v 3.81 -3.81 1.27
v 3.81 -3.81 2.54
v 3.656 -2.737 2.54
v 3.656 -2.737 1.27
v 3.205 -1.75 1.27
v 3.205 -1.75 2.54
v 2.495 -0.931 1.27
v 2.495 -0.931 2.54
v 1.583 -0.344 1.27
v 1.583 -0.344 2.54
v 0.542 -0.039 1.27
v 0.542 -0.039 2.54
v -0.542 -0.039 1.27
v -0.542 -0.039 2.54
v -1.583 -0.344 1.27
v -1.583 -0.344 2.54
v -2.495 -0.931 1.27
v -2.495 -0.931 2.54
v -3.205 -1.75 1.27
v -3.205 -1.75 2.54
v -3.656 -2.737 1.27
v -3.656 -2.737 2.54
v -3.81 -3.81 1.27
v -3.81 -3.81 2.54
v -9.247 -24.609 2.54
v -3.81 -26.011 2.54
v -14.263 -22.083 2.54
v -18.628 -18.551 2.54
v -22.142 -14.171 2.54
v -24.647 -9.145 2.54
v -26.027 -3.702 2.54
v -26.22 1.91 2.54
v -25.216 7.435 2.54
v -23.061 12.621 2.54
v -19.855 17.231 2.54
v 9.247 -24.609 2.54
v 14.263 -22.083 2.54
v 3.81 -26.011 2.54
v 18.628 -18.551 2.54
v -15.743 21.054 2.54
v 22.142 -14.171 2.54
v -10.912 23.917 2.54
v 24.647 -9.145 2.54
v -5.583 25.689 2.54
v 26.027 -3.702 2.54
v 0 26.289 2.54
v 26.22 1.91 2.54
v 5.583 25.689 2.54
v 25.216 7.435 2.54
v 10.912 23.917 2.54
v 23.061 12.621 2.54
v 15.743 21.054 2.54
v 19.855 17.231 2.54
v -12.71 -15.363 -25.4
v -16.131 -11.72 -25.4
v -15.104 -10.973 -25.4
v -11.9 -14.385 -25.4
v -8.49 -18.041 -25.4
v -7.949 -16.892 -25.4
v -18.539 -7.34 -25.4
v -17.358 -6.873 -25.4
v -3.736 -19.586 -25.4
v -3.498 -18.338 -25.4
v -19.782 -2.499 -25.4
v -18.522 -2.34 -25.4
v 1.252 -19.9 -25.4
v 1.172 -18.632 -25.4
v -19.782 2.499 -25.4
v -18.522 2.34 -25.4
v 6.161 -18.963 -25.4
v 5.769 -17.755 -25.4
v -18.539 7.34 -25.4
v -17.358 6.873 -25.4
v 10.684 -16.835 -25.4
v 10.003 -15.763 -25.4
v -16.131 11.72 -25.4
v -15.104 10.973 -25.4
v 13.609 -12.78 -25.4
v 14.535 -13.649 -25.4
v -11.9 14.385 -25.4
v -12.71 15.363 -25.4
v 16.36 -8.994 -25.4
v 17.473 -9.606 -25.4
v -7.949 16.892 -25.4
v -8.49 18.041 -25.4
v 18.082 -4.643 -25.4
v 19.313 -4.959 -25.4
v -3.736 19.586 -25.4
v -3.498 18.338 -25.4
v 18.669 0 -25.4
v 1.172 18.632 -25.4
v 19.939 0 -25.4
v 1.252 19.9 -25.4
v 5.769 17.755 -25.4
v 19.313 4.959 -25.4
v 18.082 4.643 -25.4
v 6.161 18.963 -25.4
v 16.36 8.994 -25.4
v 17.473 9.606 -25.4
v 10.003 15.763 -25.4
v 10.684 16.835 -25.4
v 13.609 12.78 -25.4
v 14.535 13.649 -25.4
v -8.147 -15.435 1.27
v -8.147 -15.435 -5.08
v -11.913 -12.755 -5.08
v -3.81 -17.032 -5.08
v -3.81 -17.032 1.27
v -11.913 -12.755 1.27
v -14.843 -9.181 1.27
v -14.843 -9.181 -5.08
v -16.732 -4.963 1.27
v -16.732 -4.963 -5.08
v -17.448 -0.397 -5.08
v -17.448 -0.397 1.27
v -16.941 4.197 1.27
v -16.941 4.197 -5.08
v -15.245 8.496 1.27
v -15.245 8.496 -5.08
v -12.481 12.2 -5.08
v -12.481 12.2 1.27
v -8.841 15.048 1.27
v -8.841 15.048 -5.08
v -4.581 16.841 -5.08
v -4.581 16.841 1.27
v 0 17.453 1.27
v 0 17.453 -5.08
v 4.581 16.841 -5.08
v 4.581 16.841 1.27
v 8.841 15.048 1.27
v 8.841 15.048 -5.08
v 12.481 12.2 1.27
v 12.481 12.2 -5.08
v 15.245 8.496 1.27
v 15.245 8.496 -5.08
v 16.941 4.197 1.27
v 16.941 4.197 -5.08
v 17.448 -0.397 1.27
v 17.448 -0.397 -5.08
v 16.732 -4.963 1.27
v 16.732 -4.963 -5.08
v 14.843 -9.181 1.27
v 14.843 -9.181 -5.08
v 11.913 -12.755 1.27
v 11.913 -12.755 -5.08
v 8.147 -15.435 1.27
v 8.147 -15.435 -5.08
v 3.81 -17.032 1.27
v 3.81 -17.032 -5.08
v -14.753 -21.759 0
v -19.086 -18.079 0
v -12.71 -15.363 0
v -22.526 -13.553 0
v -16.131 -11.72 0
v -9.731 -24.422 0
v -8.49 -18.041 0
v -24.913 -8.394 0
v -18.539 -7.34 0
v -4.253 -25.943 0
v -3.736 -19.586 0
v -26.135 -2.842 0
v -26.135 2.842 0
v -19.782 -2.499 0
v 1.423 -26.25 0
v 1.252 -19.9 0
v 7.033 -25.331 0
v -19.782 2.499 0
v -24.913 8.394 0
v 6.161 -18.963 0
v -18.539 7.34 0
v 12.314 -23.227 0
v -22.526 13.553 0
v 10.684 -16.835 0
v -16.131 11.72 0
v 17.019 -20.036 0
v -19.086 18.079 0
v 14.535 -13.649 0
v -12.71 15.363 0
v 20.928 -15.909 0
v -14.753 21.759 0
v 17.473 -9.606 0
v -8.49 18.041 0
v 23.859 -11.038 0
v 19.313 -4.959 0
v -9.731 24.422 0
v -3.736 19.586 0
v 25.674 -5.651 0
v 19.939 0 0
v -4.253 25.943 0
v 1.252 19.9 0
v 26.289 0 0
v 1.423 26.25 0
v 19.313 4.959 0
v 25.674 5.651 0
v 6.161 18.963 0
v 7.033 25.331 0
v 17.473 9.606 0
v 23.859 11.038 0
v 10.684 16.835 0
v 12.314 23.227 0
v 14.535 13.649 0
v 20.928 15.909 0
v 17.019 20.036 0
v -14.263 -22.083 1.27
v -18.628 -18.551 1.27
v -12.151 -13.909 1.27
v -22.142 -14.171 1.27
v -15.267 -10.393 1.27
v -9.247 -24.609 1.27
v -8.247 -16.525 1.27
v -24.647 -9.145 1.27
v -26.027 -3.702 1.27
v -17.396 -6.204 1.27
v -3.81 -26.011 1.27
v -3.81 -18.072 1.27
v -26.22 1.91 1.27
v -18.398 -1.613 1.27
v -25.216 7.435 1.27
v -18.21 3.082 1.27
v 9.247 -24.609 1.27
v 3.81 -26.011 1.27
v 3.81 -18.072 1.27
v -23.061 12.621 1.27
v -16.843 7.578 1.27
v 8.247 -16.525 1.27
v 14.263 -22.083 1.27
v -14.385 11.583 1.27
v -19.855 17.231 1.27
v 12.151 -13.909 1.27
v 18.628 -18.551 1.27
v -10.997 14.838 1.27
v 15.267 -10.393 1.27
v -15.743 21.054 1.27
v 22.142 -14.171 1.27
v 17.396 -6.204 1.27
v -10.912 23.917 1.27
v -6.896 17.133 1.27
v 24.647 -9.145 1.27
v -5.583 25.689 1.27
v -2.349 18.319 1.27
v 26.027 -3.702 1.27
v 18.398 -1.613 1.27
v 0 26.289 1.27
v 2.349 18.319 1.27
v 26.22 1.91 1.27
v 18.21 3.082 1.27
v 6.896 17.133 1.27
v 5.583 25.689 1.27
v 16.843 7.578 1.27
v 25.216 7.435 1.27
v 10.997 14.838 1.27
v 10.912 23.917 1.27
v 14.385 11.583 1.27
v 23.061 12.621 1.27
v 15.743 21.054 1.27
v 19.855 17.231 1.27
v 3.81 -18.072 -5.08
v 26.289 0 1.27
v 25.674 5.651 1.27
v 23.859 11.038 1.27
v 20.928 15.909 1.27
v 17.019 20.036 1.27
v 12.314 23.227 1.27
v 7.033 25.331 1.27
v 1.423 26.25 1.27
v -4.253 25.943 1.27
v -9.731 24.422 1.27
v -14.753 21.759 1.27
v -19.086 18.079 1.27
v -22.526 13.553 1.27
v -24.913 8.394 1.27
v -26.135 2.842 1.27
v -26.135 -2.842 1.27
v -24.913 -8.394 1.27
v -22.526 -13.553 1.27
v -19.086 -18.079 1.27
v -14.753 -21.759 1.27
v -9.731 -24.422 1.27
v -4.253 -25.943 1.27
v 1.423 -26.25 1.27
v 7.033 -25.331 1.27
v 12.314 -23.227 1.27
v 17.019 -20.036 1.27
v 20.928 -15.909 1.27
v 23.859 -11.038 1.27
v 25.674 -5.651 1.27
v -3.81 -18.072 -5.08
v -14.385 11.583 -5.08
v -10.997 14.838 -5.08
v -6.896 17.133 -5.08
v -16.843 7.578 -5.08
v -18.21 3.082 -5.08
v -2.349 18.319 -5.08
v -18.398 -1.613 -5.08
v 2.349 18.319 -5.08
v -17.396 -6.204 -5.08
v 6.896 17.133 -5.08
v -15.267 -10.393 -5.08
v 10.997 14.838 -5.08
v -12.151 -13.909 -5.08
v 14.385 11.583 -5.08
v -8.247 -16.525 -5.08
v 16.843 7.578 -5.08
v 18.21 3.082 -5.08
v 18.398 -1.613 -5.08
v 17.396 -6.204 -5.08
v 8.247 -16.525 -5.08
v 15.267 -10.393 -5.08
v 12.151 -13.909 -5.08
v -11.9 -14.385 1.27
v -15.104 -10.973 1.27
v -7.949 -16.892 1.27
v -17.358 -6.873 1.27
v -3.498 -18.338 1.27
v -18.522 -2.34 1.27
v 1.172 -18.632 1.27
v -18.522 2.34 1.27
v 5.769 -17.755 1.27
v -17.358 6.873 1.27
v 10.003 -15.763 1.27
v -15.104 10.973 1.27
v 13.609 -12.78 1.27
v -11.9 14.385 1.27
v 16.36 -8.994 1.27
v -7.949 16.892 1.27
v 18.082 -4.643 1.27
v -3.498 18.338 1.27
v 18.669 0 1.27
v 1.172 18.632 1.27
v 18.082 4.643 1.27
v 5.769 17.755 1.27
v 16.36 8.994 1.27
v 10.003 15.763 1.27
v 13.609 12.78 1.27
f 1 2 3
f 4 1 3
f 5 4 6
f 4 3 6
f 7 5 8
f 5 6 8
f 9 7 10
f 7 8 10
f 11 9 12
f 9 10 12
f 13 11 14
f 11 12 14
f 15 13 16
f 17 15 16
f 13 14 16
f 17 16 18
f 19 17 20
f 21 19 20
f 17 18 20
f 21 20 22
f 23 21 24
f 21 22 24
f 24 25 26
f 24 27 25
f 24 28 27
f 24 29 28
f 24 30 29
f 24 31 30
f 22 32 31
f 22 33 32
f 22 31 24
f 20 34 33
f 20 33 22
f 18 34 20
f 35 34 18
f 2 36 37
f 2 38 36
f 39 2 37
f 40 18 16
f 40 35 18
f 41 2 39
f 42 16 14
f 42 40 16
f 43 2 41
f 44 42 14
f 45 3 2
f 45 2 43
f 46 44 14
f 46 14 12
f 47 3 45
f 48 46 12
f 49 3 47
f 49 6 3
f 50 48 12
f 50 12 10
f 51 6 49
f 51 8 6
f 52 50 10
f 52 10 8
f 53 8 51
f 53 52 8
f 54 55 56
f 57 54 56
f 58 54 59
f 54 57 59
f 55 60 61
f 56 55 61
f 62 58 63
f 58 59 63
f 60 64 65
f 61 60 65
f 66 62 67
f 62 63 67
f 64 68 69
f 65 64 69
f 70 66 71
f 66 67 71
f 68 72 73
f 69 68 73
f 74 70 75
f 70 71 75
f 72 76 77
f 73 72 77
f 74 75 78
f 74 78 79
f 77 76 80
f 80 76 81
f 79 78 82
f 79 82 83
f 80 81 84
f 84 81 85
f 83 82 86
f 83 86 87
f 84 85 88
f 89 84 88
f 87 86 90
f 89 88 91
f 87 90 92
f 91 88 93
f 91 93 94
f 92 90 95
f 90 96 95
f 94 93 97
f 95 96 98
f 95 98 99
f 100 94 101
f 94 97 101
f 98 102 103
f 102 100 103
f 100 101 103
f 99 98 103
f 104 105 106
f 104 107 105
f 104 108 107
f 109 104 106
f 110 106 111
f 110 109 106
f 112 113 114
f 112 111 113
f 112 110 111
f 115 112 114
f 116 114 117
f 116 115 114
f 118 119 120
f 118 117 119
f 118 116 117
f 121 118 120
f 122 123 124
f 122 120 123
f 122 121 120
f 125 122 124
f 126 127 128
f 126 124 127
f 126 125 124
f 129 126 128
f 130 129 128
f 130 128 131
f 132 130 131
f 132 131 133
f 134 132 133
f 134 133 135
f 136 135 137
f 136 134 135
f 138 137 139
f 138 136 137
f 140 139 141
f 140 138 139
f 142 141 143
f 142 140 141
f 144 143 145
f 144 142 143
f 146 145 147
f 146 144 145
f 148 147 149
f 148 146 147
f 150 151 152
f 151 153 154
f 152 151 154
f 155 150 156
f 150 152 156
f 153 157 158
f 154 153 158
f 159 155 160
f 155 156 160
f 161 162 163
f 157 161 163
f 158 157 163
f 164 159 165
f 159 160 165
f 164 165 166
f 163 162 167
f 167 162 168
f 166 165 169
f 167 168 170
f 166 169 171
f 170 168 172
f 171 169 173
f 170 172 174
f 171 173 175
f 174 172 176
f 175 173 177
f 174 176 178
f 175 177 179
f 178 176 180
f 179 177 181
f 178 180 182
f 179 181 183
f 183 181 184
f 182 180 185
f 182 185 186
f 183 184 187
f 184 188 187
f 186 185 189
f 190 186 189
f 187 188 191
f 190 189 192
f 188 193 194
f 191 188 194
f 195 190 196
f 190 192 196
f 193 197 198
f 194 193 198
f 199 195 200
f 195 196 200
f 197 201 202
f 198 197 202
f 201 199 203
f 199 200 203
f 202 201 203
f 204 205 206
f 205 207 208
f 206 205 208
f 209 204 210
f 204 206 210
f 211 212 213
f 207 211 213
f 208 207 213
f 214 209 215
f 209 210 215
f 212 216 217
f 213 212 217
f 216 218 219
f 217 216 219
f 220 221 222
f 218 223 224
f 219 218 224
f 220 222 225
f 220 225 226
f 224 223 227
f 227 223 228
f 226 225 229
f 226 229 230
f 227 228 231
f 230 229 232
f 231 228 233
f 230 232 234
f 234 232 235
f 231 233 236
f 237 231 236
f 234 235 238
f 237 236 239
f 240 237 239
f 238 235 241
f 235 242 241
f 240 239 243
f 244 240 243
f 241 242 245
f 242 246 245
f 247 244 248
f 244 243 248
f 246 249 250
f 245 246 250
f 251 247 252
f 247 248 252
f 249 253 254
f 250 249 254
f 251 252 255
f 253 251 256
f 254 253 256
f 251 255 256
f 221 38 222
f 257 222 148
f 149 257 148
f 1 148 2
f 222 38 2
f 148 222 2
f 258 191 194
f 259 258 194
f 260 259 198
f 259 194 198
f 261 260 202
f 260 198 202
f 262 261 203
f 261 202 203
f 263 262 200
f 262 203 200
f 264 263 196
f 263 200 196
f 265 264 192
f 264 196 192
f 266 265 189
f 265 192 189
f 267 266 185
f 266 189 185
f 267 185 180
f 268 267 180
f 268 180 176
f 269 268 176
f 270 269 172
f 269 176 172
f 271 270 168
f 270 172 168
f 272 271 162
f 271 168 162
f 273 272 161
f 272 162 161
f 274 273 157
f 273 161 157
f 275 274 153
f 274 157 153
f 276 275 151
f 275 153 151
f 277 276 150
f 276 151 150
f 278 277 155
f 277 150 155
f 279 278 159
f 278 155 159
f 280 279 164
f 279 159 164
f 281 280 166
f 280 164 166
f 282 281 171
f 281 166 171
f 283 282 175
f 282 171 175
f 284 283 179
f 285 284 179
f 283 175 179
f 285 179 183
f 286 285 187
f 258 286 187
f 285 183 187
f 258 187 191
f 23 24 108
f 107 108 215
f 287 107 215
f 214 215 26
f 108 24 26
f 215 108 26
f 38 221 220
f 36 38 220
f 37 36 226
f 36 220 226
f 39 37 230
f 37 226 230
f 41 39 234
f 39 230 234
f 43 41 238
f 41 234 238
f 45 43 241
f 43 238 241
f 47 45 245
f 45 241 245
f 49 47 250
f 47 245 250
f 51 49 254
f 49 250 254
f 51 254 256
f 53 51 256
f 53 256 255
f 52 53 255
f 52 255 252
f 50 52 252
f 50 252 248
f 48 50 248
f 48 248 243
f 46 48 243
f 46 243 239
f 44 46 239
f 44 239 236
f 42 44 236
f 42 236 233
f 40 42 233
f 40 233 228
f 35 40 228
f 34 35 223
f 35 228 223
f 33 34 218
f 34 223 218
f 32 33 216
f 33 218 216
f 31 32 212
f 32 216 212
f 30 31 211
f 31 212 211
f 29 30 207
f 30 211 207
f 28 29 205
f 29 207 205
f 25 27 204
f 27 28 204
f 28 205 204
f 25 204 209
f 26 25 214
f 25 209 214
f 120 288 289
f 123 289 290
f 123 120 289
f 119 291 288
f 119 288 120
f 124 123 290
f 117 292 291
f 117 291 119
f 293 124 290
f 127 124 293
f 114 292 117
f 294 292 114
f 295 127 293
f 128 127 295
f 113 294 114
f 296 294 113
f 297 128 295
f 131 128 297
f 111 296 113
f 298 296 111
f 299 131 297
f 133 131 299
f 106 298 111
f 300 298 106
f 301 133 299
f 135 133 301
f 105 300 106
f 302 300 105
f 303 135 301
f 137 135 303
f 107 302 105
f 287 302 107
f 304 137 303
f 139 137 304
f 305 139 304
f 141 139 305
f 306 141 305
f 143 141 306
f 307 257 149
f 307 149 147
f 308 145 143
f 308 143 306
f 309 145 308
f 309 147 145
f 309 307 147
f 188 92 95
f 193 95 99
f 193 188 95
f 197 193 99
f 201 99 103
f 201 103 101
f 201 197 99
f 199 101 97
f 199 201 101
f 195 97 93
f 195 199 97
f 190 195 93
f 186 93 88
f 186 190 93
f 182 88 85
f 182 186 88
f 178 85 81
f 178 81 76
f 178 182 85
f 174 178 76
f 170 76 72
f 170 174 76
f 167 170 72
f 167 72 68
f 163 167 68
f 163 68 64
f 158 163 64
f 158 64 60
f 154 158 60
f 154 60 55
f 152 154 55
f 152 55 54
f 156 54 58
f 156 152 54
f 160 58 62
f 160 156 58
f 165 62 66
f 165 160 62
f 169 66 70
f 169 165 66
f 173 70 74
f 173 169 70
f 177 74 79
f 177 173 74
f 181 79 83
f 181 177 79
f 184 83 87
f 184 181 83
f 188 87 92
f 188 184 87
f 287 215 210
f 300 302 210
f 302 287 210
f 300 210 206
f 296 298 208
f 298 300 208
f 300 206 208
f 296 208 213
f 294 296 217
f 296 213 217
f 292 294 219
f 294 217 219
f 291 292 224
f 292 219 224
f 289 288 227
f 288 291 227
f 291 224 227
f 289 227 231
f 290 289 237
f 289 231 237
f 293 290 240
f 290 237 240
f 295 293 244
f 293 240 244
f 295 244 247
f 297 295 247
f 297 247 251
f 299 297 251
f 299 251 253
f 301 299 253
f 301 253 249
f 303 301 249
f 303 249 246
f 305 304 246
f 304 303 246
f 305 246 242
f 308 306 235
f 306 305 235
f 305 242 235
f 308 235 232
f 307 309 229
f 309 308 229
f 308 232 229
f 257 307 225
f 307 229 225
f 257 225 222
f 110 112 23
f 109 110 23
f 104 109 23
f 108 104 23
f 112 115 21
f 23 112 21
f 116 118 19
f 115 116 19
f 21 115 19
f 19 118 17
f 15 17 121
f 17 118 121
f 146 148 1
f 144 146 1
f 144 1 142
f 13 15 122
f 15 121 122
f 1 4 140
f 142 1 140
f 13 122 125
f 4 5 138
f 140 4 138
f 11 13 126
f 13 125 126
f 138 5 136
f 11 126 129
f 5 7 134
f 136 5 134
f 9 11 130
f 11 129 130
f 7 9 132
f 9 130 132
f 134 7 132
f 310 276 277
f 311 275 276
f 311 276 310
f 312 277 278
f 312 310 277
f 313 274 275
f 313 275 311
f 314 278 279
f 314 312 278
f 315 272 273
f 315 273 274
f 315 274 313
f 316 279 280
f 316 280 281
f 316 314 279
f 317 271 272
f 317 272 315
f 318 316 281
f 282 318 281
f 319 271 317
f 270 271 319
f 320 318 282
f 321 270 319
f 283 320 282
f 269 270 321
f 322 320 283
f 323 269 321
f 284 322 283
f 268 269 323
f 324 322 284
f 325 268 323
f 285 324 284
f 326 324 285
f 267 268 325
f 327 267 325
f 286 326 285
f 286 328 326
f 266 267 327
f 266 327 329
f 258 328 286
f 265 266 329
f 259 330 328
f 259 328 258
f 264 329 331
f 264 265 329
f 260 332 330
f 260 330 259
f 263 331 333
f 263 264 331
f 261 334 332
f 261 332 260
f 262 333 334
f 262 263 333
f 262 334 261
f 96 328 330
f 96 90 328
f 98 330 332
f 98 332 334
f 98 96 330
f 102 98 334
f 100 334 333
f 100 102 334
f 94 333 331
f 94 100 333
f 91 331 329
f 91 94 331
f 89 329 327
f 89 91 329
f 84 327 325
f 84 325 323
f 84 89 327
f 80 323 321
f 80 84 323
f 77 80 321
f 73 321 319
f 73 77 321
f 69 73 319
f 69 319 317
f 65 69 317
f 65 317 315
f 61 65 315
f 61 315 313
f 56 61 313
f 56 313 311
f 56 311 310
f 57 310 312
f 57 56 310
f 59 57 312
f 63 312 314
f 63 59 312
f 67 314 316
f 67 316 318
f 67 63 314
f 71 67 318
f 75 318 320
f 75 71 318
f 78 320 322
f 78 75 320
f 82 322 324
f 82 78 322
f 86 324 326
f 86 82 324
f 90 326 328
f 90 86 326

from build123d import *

# Parameters (mm, degrees)
F0_R     = 19.939
F0_R_2   = 18.669
F1_DEPTH = 25.4
F0_R_3   = 26.289
F2_DEPTH = 1.27
F3_R     = 26.289
F4_DEPTH = 1.27
F5_R     = 18.469
F5_R_2   = 17.453
F6_DEPTH = 6.35
F8_DEPTH = 27.941


# Not quite as in the source:
# - a length typed as a fraction of an inch, garbled in the dataset ("3 / 203.2 mm" for 3/8 in), is restored


with BuildPart() as f1:
    # F0 (on Top) → F1 (new body)
    with BuildSketch(Plane.XY):
        Circle(F0_R)
        Circle(F0_R_2, mode=Mode.SUBTRACT)
    extrude(amount=-F1_DEPTH)

    # F0 (on Top) → F2 (join)
    with BuildSketch(Plane.XY):
        Circle(F0_R_3)
        Circle(F0_R, mode=Mode.SUBTRACT)
        Circle(F0_R)
        Circle(F0_R_2, mode=Mode.SUBTRACT)
    extrude(amount=F2_DEPTH)


with BuildPart() as f4:
    # F3 (on face) → F4 (new body)
    with BuildSketch(Plane.XY.offset(1.27)):
        Circle(F3_R)
    extrude(amount=F4_DEPTH)

    # F5 (on face) → F6 (join)
    with BuildSketch(Plane(origin=(0, 0, 1.27), x_dir=(1, 0, 0), z_dir=(0, 0, -1))):
        Circle(F5_R)
        Circle(F5_R_2, mode=Mode.SUBTRACT)
    extrude(amount=F6_DEPTH)

    # F7 (on face) → F8 (cut, through all)
    with BuildSketch(Plane.XY.offset(2.54)):
        with BuildLine():
            Line((3.81, -26.0114478836), (3.81, -3.81))
            ThreePointArc((3.81, -3.81), (0, 0), (-3.81, -3.81))
            Line((-3.81, -3.81), (-3.81, -26.0114478836))
            ThreePointArc((-3.81, -26.0114478836), (0, -26.289), (3.81, -26.0114478836))
        make_face()
    extrude(amount=-F8_DEPTH, mode=Mode.SUBTRACT)


solid = Compound([f1.part, f4.part])
